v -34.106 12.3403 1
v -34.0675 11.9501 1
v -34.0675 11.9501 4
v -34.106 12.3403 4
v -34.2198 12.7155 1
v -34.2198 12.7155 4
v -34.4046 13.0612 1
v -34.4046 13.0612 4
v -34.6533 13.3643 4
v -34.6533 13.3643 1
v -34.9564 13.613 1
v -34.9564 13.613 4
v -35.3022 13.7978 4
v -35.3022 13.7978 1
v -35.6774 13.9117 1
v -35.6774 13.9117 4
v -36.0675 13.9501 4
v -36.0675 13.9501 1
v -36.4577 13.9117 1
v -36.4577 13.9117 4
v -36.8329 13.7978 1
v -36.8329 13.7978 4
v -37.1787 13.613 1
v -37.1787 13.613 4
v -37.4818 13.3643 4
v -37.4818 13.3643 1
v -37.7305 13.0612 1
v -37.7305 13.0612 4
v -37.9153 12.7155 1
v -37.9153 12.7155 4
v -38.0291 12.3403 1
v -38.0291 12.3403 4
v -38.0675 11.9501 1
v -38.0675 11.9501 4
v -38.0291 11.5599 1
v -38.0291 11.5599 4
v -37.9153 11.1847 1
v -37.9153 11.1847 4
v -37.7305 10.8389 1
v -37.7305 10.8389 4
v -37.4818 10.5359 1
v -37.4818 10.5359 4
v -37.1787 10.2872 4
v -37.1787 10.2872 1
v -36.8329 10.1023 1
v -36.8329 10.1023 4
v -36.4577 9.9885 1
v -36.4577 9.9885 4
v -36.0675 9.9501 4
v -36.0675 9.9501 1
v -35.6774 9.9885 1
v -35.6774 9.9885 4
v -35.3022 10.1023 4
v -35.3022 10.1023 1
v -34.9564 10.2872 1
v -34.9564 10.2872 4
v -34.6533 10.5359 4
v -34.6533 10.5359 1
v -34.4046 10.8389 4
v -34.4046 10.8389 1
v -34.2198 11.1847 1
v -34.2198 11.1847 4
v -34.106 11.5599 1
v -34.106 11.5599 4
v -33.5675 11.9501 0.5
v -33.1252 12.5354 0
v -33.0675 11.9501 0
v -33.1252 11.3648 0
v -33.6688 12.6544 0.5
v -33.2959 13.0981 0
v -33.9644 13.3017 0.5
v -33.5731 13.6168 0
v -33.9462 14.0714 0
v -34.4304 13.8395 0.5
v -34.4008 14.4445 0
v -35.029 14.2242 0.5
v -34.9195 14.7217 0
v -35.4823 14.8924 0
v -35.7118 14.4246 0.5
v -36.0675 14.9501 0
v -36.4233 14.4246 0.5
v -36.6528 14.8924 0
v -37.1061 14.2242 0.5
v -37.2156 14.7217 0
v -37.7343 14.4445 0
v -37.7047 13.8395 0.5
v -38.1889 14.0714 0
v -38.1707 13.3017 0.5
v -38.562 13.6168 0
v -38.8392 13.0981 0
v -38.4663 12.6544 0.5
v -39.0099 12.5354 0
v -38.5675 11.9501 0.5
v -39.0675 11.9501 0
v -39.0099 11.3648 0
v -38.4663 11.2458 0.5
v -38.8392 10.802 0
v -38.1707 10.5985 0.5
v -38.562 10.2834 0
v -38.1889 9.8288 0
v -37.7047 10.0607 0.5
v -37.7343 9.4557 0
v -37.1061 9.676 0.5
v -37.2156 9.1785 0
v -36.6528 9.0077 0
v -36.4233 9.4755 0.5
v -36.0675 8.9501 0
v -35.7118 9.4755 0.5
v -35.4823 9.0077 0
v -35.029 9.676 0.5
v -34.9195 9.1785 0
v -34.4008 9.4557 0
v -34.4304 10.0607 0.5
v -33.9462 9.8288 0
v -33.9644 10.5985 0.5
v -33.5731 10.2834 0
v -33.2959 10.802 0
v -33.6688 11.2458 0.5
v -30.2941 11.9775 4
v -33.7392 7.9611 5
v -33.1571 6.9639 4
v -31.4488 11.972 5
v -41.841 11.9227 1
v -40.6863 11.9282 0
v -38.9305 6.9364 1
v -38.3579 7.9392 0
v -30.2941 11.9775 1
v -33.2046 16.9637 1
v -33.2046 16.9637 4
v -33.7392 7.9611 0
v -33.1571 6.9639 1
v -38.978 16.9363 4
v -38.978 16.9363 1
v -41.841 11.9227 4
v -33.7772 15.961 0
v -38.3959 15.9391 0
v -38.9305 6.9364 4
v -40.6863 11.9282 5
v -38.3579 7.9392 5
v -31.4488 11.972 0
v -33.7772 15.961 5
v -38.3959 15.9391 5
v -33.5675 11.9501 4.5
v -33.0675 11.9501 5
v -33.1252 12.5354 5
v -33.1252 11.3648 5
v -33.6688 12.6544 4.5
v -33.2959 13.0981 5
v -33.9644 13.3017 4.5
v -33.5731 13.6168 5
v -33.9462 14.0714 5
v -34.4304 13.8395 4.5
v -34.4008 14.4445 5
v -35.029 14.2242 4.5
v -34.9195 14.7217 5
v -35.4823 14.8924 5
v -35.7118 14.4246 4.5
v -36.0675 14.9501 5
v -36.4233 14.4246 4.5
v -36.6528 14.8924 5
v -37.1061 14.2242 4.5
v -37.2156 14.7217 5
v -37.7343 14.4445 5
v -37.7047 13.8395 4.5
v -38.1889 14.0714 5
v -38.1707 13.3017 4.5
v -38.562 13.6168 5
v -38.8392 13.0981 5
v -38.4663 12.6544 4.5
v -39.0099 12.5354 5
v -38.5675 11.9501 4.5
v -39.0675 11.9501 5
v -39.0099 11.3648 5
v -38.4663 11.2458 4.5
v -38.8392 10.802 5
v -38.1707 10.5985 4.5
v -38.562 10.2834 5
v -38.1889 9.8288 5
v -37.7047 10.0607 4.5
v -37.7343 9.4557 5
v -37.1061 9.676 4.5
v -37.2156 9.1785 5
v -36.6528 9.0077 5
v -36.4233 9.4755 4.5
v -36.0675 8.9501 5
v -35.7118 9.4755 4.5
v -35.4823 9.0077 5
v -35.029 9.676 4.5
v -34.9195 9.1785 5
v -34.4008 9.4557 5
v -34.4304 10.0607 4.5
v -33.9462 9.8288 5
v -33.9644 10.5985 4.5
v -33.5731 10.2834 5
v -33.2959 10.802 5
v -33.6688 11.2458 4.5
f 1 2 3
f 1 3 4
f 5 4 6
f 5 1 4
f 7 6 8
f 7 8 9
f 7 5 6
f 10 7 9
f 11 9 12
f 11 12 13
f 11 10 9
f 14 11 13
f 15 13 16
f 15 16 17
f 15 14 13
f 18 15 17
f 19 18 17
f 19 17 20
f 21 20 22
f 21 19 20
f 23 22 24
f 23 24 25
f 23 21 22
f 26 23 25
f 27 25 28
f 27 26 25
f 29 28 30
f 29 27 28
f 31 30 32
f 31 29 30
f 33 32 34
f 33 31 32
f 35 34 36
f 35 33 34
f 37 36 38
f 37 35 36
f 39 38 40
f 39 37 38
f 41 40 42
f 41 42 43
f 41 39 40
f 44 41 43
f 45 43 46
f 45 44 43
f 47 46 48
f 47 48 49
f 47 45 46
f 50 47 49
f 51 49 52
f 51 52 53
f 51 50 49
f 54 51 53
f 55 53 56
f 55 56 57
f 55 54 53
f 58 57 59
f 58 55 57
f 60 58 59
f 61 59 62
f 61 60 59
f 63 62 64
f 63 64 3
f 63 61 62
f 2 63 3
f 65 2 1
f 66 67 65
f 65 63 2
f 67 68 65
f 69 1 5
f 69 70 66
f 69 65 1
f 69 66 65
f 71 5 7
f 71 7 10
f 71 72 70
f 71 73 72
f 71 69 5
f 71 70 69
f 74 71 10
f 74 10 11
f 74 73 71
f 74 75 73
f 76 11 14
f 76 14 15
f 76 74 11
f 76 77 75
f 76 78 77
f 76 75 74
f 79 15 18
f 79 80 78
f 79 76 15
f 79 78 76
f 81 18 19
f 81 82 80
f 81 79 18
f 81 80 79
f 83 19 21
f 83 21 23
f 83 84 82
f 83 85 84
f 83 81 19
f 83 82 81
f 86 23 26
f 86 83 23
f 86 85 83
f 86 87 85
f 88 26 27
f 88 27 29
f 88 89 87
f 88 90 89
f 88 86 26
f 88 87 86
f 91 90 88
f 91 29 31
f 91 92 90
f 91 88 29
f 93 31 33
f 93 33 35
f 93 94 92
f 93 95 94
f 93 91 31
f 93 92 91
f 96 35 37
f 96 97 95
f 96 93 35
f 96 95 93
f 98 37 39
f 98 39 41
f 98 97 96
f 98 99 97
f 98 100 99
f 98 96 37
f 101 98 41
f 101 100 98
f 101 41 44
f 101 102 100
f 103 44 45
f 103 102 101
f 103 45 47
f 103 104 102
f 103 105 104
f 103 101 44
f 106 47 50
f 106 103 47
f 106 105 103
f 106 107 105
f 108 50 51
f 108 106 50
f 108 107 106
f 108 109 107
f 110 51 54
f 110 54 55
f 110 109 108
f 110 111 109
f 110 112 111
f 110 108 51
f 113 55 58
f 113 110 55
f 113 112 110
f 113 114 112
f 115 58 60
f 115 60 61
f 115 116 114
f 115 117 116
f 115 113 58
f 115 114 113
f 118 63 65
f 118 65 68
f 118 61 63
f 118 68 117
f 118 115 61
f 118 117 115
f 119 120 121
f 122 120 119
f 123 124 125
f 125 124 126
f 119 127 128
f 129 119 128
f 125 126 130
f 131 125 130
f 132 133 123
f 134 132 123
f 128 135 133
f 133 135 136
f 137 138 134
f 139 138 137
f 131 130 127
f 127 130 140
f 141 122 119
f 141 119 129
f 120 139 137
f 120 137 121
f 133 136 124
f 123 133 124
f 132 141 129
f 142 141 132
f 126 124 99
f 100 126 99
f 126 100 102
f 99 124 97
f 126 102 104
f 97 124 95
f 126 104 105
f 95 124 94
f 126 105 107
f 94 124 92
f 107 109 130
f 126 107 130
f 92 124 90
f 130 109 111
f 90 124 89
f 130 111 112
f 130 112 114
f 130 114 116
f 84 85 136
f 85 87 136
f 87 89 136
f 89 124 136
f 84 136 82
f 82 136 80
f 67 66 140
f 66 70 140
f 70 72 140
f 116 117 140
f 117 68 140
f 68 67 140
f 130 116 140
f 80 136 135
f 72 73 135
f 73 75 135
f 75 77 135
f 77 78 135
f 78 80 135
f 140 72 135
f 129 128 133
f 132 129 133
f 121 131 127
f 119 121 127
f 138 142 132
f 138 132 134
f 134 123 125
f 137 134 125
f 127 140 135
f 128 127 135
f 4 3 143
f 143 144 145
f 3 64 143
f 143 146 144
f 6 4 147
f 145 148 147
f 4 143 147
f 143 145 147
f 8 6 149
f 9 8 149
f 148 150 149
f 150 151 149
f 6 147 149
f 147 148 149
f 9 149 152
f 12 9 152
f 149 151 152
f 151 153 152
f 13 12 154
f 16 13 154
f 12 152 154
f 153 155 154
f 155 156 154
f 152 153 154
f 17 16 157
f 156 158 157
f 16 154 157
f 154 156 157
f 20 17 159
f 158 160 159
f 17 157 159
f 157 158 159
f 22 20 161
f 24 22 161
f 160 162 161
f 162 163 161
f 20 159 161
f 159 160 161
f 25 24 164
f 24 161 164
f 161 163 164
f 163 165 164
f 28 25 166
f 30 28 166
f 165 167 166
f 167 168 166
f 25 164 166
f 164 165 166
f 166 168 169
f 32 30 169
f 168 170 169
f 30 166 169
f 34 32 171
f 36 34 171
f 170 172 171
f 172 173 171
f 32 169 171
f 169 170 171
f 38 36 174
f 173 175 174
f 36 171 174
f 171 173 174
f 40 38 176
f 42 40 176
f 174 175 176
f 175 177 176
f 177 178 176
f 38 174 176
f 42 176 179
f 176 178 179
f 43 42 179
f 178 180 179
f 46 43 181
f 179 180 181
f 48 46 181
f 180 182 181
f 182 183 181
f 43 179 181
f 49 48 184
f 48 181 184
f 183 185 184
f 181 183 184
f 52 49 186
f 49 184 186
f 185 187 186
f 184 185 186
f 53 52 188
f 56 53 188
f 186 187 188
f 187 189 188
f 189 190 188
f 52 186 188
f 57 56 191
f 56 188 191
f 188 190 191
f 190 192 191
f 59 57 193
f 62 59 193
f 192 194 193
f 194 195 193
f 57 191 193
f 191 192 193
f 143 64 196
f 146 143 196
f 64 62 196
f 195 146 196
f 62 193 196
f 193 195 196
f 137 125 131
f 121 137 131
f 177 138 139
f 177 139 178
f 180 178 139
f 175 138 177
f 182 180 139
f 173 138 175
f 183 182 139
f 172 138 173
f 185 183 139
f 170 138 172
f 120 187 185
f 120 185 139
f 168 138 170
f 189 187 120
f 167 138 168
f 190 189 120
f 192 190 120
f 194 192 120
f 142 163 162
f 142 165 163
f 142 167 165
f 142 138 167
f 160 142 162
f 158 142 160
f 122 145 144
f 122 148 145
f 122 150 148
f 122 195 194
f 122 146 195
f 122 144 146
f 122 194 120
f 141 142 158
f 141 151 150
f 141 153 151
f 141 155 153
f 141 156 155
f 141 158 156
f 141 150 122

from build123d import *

# Parameters (mm, degrees)
SKETCH2_R           = 2
BOSS_EXTRUDE1_DEPTH = 5
CHAMFER2_SIZE       = 1


with BuildPart() as part:
    # Sketch2 → Boss-Extrude1 (new body)
    with BuildSketch(Plane.XY):
        Polygon((-33.204562103, 16.96373801), (-38.977999735, 16.936329175), (-41.840981804, 11.922681101), (-38.93052624, 6.936441863), (-33.157088608, 6.963850698), (-30.29410654, 11.977498771), align=None)
        with Locations((-36.067544172, 11.950089936)):
            Circle(SKETCH2_R, mode=Mode.SUBTRACT)
    extrude(amount=BOSS_EXTRUDE1_DEPTH)

    # Chamfer2
    chamfer2_edges = [part.edges().sort_by_distance(p)[0] for p in [
        (-40.409490769, 14.429505138, 5),
        (-40.385754022, 9.429561482, 5),
        (-38.067544172, 11.950089936, 0),
        (-38.067544172, 11.950089936, 5),
        (-36.043807424, 6.95014628, 5),
        (-31.725597574, 9.470674734, 5),
        (-31.749334322, 14.470618391, 5),
        (-31.725597574, 9.470674734, 0),
        (-36.043807424, 6.95014628, 0),
        (-40.385754022, 9.429561482, 0),
        (-40.409490769, 14.429505138, 0),
        (-36.091280919, 16.950033593, 0),
        (-31.749334322, 14.470618391, 0),
        (-36.091280919, 16.950033593, 5),
    ]]
    chamfer(chamfer2_edges, length=CHAMFER2_SIZE)


solid = part.part
